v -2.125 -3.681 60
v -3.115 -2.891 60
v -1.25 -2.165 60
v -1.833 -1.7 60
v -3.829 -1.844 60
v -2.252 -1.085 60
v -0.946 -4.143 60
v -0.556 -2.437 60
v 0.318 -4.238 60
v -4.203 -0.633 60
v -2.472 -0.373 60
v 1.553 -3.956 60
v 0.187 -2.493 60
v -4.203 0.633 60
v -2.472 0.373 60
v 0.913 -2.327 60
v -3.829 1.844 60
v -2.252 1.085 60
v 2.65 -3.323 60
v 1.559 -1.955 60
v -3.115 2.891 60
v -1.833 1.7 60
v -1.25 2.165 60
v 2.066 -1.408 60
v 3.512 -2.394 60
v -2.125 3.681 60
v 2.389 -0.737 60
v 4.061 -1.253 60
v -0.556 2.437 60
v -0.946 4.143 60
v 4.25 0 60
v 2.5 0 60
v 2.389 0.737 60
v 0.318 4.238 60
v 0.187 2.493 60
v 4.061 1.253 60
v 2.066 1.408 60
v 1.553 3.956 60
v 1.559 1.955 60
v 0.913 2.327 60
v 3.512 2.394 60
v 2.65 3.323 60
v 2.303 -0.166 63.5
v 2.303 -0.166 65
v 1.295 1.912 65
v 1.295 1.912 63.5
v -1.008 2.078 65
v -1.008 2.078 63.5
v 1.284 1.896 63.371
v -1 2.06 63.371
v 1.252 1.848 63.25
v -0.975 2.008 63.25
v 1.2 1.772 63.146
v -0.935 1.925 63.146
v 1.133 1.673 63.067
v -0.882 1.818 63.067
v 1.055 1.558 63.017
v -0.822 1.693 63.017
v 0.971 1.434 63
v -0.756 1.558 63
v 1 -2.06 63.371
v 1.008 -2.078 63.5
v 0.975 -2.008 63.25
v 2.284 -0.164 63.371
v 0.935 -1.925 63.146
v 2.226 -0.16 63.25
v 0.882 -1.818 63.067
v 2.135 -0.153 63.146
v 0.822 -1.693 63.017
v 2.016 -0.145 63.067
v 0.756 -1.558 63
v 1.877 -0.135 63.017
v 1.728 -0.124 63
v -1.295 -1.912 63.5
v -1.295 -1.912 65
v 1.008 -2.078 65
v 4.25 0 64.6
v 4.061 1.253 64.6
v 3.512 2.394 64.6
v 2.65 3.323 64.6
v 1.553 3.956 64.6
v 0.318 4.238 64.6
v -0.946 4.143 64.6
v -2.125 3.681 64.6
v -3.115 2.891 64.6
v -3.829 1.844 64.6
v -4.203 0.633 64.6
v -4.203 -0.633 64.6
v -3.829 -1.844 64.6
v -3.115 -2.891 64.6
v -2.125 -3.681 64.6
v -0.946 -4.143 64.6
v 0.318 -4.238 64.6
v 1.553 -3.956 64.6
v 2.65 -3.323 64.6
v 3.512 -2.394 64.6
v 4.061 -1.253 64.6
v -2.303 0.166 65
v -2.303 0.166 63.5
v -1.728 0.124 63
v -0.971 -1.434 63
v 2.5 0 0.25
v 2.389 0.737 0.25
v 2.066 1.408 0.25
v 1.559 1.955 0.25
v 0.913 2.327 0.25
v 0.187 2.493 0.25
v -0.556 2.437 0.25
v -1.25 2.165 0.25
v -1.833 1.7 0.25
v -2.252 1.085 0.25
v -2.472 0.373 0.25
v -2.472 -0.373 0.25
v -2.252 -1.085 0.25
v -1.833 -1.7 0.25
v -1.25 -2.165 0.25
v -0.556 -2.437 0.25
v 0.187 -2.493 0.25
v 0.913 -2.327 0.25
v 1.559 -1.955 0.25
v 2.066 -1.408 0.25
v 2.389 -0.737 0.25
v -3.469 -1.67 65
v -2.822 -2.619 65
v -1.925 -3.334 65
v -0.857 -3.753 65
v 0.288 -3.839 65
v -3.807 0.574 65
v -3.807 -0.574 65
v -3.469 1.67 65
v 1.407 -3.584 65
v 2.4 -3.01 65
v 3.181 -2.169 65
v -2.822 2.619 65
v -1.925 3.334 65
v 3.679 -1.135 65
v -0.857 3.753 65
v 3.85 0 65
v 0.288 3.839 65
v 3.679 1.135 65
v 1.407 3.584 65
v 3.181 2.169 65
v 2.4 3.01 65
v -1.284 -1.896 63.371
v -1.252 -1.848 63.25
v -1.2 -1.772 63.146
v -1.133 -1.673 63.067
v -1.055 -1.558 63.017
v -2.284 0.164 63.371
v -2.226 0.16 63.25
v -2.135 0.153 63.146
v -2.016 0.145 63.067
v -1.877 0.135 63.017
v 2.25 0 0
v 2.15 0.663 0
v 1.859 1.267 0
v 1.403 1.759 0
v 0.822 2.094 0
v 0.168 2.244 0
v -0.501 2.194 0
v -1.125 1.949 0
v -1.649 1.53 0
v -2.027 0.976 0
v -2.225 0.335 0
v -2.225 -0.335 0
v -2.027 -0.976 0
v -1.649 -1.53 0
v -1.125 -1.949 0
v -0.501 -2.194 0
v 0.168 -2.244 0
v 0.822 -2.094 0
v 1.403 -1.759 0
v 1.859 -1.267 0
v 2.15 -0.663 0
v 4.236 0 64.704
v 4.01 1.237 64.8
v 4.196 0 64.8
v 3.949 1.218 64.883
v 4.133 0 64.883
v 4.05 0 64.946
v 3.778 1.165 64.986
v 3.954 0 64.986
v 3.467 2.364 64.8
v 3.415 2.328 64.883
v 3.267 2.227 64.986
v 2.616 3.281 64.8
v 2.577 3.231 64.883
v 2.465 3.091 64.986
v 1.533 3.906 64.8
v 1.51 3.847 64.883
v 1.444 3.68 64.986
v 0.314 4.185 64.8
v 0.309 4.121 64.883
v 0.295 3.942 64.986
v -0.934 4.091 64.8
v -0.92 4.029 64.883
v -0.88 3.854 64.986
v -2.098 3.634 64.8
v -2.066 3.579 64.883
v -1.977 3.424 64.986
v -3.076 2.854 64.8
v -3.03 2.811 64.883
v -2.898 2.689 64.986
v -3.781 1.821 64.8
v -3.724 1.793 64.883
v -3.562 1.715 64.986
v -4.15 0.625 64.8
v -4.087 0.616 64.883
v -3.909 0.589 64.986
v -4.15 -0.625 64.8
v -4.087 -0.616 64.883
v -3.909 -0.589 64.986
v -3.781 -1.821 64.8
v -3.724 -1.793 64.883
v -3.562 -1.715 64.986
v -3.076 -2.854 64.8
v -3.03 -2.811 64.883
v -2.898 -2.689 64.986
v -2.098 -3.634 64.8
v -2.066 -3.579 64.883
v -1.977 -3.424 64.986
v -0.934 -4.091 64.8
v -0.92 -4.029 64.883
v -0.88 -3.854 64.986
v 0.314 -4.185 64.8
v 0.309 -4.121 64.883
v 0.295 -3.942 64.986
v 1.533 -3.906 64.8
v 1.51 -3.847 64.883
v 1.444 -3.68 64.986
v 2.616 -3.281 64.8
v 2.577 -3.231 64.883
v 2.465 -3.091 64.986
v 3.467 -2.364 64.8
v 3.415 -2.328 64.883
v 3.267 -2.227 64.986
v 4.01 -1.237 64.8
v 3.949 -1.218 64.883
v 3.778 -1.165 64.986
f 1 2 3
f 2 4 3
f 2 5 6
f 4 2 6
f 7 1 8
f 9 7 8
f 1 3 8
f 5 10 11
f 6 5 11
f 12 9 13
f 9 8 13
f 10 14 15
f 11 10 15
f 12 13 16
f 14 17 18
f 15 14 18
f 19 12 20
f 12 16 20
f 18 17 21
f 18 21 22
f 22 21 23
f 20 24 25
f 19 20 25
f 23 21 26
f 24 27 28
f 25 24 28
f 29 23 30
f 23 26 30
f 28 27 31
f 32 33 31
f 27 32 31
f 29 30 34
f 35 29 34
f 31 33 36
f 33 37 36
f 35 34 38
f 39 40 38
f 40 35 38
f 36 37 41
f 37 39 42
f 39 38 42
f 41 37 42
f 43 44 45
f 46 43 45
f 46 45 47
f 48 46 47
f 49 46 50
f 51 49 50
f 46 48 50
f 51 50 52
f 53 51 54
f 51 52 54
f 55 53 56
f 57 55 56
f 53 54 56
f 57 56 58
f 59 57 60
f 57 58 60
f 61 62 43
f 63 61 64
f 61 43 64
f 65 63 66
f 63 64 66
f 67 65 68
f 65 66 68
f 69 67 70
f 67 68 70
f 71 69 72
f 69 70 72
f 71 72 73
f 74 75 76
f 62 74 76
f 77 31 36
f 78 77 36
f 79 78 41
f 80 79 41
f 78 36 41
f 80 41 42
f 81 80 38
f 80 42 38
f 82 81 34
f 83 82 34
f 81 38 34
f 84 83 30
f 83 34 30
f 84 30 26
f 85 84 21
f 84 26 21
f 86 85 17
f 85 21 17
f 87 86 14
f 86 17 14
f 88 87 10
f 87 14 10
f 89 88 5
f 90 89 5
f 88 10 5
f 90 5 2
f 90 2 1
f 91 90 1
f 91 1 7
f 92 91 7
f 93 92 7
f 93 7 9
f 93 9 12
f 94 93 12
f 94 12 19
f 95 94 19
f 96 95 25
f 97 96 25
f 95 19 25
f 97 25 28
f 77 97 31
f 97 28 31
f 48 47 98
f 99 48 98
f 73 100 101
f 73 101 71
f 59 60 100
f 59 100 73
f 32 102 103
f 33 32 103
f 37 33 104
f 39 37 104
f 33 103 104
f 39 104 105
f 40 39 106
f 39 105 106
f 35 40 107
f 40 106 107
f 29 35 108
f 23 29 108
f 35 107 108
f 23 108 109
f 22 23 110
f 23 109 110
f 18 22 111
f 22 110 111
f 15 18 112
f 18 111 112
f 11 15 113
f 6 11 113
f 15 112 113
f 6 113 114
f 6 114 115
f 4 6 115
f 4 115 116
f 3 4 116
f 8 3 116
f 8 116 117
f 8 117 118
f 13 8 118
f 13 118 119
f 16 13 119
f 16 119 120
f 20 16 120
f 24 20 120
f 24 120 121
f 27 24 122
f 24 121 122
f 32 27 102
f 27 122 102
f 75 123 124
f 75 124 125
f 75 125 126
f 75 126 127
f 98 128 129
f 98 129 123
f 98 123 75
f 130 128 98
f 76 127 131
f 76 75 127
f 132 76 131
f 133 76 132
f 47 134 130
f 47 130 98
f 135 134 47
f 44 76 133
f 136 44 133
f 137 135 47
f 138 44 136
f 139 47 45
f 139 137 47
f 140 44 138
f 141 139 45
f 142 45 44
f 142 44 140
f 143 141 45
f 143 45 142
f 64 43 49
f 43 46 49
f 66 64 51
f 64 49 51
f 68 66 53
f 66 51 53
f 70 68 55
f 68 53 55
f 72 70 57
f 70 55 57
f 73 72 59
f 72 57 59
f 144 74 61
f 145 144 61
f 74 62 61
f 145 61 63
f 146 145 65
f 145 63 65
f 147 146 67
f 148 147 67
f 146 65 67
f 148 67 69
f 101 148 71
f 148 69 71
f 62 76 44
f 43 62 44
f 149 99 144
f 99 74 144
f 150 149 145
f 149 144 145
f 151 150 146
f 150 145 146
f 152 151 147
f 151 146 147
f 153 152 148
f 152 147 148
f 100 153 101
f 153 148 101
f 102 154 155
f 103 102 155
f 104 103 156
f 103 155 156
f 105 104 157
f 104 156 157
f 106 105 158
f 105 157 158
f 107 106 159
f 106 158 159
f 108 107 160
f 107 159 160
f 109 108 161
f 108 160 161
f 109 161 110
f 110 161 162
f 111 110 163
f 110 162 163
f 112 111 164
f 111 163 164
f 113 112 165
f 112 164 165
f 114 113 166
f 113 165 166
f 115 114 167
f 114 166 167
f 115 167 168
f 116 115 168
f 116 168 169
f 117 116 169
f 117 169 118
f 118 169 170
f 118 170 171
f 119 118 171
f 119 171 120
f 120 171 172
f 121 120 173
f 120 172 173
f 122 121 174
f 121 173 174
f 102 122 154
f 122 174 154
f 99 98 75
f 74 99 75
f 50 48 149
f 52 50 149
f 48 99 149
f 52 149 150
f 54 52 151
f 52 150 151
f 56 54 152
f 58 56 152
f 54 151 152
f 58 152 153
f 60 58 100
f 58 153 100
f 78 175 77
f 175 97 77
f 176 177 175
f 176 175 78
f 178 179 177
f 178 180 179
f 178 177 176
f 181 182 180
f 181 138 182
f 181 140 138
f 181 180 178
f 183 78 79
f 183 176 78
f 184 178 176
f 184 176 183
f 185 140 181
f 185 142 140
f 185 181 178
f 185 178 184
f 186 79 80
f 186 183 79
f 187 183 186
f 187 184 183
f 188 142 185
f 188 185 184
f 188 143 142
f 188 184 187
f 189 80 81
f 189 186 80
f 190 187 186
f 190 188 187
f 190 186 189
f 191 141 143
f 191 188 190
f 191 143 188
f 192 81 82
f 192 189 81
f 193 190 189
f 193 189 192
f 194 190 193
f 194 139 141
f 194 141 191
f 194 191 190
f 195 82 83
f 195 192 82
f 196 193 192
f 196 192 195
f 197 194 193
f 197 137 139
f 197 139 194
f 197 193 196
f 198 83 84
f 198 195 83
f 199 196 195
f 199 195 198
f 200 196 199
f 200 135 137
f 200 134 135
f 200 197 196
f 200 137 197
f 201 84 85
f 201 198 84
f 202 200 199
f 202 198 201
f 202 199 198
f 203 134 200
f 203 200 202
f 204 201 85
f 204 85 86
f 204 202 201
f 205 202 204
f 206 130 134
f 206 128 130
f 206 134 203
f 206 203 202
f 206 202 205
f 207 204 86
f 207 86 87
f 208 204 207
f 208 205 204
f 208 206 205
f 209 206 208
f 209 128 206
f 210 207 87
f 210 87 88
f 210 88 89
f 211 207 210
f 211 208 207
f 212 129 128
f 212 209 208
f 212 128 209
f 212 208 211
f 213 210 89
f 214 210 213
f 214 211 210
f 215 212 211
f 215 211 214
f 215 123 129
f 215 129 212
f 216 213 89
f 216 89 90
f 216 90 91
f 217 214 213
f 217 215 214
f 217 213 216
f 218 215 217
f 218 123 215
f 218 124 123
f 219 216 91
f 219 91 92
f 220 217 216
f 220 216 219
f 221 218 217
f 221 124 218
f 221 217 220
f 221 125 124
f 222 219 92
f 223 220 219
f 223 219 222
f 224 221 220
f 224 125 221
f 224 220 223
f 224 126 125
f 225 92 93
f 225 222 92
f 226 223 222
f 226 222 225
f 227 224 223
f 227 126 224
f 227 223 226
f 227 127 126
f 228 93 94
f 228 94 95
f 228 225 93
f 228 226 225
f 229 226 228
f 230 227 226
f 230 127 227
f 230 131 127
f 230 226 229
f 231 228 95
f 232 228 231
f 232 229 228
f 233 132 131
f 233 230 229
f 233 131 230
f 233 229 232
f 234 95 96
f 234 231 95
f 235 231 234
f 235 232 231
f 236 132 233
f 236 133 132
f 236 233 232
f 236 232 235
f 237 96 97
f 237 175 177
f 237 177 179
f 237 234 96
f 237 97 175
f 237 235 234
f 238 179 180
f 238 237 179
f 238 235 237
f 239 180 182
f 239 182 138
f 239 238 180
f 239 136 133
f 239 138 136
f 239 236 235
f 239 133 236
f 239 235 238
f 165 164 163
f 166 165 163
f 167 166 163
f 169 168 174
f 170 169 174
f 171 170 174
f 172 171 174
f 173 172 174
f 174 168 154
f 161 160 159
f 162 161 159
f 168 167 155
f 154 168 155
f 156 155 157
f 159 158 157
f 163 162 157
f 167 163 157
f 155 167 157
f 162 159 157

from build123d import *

# Parameters (mm, degrees)
SKETCH1_R           = 2.5
BOSS_EXTRUDE1_DEPTH = 60
SKETCH2_R           = 4.25
BOSS_EXTRUDE2_DEPTH = 5
CUT_EXTRUDE1_DEPTH  = 2
FILLET1_R           = 0.4
CHAMFER1_SIZE       = 0.25
FILLET2_R           = 0.5


with BuildPart() as part:
    # Sketch1 → Boss-Extrude1 (new body)
    with BuildSketch(Plane.XY):
        Circle(SKETCH1_R)
    extrude(amount=BOSS_EXTRUDE1_DEPTH)

    # Sketch2 → Boss-Extrude2 (add)
    with BuildSketch(Plane.XY.offset(60)):
        Circle(SKETCH2_R)
    extrude(amount=BOSS_EXTRUDE2_DEPTH)

    # Sketch3 → Cut-Extrude1 (cut)
    with BuildSketch(Plane.XY.offset(65)):
        Polygon((2.30345988, -0.165547312), (1.295098118, 1.912081117), (-1.008361763, 2.077628429), (-2.30345988, 0.165547312), (-1.295098118, -1.912081117), (1.008361763, -2.077628429), align=None)
    extrude(amount=-CUT_EXTRUDE1_DEPTH, mode=Mode.SUBTRACT)

    # Fillet1
    fillet1_edges = [part.edges().sort_by_distance(p)[0] for p in [
        (-4.25, 0, 65),
    ]]
    fillet(fillet1_edges, radius=FILLET1_R)

    # Chamfer1
    chamfer1_edges = [part.edges().sort_by_distance(p)[0] for p in [
        (-2.5, 0, 0),
    ]]
    chamfer(chamfer1_edges, length=CHAMFER1_SIZE)

    # Fillet2
    fillet2_edges = [part.edges().sort_by_distance(p)[0] for p in [
        (1.655910822, -1.12158787, 63),
        (-0.143368178, -1.994854773, 63),
        (-1.799278999, -0.873266903, 63),
        (-1.655910822, 1.12158787, 63),
        (0.143368178, 1.994854773, 63),
        (1.799278999, 0.873266903, 63),
    ]]
    fillet(fillet2_edges, radius=FILLET2_R)


solid = part.part
